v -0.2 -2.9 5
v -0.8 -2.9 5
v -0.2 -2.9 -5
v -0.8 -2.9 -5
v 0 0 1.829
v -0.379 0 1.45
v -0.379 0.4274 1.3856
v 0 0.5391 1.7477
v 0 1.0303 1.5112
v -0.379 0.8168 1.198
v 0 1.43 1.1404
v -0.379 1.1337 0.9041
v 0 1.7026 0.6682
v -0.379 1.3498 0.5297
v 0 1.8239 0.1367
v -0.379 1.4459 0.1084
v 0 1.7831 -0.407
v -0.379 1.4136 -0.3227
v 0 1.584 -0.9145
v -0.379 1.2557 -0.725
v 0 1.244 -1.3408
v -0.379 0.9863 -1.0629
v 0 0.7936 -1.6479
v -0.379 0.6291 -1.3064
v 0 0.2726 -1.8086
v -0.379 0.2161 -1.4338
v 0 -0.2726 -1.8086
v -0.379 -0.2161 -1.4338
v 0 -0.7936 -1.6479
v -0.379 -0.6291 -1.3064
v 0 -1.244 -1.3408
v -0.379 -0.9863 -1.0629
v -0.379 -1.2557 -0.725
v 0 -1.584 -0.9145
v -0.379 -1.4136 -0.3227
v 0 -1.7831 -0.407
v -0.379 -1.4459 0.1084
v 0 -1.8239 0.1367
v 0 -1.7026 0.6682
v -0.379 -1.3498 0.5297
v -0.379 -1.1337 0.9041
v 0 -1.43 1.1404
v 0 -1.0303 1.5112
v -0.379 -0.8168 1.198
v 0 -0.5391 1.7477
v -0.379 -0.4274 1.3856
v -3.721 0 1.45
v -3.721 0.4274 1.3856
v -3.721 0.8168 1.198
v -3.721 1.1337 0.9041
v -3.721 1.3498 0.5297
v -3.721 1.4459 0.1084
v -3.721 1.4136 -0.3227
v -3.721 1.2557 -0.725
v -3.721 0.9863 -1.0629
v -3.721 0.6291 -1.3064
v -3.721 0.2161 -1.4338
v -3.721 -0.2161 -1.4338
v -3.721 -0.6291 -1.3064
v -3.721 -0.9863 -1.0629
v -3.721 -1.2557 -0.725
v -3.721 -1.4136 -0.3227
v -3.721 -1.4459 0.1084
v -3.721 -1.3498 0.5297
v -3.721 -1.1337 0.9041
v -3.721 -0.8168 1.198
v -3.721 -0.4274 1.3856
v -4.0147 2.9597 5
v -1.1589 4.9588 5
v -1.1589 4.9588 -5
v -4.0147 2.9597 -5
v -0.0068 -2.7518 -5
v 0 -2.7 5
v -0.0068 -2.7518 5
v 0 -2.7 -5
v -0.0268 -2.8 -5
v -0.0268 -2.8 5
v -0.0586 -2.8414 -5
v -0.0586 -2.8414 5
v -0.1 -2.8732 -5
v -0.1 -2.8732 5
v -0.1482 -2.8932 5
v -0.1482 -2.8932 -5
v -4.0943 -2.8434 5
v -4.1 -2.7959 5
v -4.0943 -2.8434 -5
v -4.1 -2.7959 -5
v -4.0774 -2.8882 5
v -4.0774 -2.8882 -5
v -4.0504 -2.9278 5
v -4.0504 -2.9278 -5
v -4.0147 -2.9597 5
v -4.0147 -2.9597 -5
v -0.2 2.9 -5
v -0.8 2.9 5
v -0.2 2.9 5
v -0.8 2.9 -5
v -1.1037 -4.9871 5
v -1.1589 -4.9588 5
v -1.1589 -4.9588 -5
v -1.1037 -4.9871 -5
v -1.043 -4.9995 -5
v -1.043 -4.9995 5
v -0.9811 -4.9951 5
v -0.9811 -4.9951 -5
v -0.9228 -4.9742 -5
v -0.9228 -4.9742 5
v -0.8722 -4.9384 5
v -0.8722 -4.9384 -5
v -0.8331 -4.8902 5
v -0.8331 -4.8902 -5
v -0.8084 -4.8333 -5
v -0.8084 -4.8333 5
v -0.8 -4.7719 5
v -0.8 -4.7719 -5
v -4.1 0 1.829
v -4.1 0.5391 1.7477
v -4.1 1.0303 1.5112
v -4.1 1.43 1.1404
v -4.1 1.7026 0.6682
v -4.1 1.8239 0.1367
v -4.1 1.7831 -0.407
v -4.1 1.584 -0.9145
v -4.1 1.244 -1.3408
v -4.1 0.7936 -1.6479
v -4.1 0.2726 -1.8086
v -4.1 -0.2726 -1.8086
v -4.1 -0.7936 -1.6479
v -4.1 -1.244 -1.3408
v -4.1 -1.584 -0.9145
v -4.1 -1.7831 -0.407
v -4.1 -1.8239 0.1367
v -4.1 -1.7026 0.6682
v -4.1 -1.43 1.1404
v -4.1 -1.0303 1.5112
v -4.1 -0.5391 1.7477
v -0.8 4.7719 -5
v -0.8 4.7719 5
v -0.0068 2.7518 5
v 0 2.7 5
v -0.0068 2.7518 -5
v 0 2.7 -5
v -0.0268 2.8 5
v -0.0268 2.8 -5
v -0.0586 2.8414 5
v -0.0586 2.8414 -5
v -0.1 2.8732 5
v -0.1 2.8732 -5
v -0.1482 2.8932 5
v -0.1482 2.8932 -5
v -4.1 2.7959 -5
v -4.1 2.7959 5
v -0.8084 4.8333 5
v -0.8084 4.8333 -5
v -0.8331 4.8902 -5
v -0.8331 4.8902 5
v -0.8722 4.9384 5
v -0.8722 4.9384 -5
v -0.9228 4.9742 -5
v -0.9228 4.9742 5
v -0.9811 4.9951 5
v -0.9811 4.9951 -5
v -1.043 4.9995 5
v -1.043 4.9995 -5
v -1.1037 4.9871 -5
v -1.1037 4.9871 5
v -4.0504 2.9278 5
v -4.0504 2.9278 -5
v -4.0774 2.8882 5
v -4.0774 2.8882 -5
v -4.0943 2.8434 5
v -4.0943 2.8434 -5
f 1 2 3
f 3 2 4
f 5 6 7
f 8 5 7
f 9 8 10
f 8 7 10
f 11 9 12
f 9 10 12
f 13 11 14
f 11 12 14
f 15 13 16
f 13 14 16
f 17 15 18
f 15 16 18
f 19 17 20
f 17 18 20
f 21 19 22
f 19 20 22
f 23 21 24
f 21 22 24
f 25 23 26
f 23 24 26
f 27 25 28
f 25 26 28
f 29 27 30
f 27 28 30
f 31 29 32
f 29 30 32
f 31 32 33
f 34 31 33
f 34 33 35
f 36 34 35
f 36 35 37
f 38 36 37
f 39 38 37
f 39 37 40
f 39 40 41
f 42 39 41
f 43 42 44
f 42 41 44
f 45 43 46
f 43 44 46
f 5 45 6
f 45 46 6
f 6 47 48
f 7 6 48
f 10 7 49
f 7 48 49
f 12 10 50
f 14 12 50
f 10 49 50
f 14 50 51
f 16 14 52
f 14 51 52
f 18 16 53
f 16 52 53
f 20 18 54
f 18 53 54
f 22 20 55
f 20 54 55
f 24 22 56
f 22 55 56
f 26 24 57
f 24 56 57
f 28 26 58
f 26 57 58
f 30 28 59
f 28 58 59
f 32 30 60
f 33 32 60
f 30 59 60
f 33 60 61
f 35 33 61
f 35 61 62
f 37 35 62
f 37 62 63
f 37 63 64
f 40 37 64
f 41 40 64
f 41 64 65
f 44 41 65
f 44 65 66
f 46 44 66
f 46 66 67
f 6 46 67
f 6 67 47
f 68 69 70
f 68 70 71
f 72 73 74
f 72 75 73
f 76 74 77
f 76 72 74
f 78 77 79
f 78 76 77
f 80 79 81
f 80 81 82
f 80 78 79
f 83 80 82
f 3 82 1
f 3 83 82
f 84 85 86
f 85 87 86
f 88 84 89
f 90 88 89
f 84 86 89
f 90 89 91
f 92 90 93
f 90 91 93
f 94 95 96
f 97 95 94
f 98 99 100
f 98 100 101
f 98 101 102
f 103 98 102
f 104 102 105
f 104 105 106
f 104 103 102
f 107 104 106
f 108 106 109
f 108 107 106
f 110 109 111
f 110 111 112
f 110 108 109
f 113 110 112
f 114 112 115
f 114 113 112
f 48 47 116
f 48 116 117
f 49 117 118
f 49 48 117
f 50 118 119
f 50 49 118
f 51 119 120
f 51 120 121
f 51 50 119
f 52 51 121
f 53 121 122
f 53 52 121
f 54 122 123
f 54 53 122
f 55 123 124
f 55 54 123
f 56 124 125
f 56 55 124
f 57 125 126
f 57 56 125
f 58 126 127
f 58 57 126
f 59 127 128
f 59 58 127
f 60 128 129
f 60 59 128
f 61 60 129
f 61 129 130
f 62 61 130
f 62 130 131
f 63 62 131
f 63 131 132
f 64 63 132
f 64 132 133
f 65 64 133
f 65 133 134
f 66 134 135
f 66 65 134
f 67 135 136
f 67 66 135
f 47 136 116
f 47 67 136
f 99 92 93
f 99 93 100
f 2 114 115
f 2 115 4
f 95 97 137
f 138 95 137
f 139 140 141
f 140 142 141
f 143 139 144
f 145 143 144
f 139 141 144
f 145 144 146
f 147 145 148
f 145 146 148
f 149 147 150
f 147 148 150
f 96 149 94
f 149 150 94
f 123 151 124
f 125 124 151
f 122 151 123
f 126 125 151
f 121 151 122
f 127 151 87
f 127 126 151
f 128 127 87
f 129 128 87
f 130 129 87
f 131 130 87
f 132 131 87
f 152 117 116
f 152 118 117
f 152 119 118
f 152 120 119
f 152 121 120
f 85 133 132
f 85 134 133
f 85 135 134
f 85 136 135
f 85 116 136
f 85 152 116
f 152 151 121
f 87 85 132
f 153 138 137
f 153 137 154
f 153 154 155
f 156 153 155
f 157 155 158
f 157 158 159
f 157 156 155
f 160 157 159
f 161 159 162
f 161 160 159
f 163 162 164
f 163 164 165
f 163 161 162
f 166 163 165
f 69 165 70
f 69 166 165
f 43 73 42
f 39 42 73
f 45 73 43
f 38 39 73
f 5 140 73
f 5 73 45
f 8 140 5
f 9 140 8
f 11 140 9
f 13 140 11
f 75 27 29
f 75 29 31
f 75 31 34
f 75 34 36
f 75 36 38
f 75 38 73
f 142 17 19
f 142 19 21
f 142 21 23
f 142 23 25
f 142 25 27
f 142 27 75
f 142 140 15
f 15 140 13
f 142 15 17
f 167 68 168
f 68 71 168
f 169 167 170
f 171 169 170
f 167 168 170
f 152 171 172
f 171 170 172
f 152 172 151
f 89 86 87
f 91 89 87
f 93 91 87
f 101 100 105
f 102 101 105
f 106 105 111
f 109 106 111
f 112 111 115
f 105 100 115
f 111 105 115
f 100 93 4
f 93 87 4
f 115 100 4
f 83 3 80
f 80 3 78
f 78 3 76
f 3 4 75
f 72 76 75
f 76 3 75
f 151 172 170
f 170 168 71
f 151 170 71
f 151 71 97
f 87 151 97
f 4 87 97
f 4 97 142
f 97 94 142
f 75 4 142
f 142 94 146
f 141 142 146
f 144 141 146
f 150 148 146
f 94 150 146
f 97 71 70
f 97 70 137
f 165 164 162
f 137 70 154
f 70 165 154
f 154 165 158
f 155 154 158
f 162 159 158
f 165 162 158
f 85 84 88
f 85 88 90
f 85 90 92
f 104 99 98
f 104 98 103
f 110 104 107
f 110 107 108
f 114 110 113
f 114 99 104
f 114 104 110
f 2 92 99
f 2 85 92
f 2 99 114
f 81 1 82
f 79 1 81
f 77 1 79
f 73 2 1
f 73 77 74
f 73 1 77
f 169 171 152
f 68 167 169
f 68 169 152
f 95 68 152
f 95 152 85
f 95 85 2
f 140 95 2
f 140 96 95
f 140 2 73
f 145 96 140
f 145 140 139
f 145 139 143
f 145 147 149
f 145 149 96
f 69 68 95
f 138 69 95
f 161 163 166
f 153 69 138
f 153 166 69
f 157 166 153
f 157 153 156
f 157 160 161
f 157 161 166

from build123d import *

# Parameters (mm, degrees)
BOSS_EXTRUDE1_DEPTH           = 10
SKETCH2_W                     = 10
SKETCH2_H                     = 5.8
BOSS_EXTRUDE2_DEPTH           = 0.8
TAP_DRILL_FOR_M3_5X0_6_TAP1_D = 2.9
CHAMFER1_SIZE                 = 0.379
FILLET1_R                     = 0.2


with BuildPart() as part:
    # Sketch1 → Boss-Extrude1 (new body)
    with BuildSketch(Plane.XY.offset(5)):
        with BuildLine():
            Line((-0.8, -4.771898466), (-0.8, 4.771898466))
            ThreePointArc((-0.8, 4.771898466), (-0.922761052, 4.974218302), (-1.158906761, 4.958765267))
            Line((-1.158906761, 4.958765267), (-4.1, 2.9))
            Line((-4.1, 2.9), (-4.1, -2.9))
            Line((-4.1, -2.9), (-1.158906761, -4.958765267))
            ThreePointArc((-1.158906761, -4.958765267), (-0.922761052, -4.974218302), (-0.8, -4.771898466))
        make_face()
    extrude(amount=-BOSS_EXTRUDE1_DEPTH)

    # Sketch2 → Boss-Extrude2 (add)
    with BuildSketch(Plane(origin=(-0.8, 0, 0), x_dir=(0, 0, -1), z_dir=(1, 0, 0))):
        Rectangle(SKETCH2_W, SKETCH2_H)
    extrude(amount=BOSS_EXTRUDE2_DEPTH)

    # Tap Drill for M3.5x0.6 Tap1 (through all)
    with Locations(Plane(origin=(0, 0, 0), x_dir=(0, 0, -1), z_dir=(1, 0, 0))):
        with Locations((0, 0)):
            Hole(TAP_DRILL_FOR_M3_5X0_6_TAP1_D / 2)

    # Chamfer1
    chamfer1_edges = [part.edges().sort_by_distance(p)[0] for p in [
        (0, 0, -1.45),
        (-4.1, 0, -1.45),
    ]]
    chamfer(chamfer1_edges, length=CHAMFER1_SIZE)

    # Fillet1
    fillet1_edges = [part.edges().sort_by_distance(p)[0] for p in [
        (-4.1, -2.9, 0),
        (-4.1, 2.9, 0),
        (0, 2.9, 0),
        (0, -2.9, 0),
    ]]
    fillet(fillet1_edges, radius=FILLET1_R)


solid = part.part
